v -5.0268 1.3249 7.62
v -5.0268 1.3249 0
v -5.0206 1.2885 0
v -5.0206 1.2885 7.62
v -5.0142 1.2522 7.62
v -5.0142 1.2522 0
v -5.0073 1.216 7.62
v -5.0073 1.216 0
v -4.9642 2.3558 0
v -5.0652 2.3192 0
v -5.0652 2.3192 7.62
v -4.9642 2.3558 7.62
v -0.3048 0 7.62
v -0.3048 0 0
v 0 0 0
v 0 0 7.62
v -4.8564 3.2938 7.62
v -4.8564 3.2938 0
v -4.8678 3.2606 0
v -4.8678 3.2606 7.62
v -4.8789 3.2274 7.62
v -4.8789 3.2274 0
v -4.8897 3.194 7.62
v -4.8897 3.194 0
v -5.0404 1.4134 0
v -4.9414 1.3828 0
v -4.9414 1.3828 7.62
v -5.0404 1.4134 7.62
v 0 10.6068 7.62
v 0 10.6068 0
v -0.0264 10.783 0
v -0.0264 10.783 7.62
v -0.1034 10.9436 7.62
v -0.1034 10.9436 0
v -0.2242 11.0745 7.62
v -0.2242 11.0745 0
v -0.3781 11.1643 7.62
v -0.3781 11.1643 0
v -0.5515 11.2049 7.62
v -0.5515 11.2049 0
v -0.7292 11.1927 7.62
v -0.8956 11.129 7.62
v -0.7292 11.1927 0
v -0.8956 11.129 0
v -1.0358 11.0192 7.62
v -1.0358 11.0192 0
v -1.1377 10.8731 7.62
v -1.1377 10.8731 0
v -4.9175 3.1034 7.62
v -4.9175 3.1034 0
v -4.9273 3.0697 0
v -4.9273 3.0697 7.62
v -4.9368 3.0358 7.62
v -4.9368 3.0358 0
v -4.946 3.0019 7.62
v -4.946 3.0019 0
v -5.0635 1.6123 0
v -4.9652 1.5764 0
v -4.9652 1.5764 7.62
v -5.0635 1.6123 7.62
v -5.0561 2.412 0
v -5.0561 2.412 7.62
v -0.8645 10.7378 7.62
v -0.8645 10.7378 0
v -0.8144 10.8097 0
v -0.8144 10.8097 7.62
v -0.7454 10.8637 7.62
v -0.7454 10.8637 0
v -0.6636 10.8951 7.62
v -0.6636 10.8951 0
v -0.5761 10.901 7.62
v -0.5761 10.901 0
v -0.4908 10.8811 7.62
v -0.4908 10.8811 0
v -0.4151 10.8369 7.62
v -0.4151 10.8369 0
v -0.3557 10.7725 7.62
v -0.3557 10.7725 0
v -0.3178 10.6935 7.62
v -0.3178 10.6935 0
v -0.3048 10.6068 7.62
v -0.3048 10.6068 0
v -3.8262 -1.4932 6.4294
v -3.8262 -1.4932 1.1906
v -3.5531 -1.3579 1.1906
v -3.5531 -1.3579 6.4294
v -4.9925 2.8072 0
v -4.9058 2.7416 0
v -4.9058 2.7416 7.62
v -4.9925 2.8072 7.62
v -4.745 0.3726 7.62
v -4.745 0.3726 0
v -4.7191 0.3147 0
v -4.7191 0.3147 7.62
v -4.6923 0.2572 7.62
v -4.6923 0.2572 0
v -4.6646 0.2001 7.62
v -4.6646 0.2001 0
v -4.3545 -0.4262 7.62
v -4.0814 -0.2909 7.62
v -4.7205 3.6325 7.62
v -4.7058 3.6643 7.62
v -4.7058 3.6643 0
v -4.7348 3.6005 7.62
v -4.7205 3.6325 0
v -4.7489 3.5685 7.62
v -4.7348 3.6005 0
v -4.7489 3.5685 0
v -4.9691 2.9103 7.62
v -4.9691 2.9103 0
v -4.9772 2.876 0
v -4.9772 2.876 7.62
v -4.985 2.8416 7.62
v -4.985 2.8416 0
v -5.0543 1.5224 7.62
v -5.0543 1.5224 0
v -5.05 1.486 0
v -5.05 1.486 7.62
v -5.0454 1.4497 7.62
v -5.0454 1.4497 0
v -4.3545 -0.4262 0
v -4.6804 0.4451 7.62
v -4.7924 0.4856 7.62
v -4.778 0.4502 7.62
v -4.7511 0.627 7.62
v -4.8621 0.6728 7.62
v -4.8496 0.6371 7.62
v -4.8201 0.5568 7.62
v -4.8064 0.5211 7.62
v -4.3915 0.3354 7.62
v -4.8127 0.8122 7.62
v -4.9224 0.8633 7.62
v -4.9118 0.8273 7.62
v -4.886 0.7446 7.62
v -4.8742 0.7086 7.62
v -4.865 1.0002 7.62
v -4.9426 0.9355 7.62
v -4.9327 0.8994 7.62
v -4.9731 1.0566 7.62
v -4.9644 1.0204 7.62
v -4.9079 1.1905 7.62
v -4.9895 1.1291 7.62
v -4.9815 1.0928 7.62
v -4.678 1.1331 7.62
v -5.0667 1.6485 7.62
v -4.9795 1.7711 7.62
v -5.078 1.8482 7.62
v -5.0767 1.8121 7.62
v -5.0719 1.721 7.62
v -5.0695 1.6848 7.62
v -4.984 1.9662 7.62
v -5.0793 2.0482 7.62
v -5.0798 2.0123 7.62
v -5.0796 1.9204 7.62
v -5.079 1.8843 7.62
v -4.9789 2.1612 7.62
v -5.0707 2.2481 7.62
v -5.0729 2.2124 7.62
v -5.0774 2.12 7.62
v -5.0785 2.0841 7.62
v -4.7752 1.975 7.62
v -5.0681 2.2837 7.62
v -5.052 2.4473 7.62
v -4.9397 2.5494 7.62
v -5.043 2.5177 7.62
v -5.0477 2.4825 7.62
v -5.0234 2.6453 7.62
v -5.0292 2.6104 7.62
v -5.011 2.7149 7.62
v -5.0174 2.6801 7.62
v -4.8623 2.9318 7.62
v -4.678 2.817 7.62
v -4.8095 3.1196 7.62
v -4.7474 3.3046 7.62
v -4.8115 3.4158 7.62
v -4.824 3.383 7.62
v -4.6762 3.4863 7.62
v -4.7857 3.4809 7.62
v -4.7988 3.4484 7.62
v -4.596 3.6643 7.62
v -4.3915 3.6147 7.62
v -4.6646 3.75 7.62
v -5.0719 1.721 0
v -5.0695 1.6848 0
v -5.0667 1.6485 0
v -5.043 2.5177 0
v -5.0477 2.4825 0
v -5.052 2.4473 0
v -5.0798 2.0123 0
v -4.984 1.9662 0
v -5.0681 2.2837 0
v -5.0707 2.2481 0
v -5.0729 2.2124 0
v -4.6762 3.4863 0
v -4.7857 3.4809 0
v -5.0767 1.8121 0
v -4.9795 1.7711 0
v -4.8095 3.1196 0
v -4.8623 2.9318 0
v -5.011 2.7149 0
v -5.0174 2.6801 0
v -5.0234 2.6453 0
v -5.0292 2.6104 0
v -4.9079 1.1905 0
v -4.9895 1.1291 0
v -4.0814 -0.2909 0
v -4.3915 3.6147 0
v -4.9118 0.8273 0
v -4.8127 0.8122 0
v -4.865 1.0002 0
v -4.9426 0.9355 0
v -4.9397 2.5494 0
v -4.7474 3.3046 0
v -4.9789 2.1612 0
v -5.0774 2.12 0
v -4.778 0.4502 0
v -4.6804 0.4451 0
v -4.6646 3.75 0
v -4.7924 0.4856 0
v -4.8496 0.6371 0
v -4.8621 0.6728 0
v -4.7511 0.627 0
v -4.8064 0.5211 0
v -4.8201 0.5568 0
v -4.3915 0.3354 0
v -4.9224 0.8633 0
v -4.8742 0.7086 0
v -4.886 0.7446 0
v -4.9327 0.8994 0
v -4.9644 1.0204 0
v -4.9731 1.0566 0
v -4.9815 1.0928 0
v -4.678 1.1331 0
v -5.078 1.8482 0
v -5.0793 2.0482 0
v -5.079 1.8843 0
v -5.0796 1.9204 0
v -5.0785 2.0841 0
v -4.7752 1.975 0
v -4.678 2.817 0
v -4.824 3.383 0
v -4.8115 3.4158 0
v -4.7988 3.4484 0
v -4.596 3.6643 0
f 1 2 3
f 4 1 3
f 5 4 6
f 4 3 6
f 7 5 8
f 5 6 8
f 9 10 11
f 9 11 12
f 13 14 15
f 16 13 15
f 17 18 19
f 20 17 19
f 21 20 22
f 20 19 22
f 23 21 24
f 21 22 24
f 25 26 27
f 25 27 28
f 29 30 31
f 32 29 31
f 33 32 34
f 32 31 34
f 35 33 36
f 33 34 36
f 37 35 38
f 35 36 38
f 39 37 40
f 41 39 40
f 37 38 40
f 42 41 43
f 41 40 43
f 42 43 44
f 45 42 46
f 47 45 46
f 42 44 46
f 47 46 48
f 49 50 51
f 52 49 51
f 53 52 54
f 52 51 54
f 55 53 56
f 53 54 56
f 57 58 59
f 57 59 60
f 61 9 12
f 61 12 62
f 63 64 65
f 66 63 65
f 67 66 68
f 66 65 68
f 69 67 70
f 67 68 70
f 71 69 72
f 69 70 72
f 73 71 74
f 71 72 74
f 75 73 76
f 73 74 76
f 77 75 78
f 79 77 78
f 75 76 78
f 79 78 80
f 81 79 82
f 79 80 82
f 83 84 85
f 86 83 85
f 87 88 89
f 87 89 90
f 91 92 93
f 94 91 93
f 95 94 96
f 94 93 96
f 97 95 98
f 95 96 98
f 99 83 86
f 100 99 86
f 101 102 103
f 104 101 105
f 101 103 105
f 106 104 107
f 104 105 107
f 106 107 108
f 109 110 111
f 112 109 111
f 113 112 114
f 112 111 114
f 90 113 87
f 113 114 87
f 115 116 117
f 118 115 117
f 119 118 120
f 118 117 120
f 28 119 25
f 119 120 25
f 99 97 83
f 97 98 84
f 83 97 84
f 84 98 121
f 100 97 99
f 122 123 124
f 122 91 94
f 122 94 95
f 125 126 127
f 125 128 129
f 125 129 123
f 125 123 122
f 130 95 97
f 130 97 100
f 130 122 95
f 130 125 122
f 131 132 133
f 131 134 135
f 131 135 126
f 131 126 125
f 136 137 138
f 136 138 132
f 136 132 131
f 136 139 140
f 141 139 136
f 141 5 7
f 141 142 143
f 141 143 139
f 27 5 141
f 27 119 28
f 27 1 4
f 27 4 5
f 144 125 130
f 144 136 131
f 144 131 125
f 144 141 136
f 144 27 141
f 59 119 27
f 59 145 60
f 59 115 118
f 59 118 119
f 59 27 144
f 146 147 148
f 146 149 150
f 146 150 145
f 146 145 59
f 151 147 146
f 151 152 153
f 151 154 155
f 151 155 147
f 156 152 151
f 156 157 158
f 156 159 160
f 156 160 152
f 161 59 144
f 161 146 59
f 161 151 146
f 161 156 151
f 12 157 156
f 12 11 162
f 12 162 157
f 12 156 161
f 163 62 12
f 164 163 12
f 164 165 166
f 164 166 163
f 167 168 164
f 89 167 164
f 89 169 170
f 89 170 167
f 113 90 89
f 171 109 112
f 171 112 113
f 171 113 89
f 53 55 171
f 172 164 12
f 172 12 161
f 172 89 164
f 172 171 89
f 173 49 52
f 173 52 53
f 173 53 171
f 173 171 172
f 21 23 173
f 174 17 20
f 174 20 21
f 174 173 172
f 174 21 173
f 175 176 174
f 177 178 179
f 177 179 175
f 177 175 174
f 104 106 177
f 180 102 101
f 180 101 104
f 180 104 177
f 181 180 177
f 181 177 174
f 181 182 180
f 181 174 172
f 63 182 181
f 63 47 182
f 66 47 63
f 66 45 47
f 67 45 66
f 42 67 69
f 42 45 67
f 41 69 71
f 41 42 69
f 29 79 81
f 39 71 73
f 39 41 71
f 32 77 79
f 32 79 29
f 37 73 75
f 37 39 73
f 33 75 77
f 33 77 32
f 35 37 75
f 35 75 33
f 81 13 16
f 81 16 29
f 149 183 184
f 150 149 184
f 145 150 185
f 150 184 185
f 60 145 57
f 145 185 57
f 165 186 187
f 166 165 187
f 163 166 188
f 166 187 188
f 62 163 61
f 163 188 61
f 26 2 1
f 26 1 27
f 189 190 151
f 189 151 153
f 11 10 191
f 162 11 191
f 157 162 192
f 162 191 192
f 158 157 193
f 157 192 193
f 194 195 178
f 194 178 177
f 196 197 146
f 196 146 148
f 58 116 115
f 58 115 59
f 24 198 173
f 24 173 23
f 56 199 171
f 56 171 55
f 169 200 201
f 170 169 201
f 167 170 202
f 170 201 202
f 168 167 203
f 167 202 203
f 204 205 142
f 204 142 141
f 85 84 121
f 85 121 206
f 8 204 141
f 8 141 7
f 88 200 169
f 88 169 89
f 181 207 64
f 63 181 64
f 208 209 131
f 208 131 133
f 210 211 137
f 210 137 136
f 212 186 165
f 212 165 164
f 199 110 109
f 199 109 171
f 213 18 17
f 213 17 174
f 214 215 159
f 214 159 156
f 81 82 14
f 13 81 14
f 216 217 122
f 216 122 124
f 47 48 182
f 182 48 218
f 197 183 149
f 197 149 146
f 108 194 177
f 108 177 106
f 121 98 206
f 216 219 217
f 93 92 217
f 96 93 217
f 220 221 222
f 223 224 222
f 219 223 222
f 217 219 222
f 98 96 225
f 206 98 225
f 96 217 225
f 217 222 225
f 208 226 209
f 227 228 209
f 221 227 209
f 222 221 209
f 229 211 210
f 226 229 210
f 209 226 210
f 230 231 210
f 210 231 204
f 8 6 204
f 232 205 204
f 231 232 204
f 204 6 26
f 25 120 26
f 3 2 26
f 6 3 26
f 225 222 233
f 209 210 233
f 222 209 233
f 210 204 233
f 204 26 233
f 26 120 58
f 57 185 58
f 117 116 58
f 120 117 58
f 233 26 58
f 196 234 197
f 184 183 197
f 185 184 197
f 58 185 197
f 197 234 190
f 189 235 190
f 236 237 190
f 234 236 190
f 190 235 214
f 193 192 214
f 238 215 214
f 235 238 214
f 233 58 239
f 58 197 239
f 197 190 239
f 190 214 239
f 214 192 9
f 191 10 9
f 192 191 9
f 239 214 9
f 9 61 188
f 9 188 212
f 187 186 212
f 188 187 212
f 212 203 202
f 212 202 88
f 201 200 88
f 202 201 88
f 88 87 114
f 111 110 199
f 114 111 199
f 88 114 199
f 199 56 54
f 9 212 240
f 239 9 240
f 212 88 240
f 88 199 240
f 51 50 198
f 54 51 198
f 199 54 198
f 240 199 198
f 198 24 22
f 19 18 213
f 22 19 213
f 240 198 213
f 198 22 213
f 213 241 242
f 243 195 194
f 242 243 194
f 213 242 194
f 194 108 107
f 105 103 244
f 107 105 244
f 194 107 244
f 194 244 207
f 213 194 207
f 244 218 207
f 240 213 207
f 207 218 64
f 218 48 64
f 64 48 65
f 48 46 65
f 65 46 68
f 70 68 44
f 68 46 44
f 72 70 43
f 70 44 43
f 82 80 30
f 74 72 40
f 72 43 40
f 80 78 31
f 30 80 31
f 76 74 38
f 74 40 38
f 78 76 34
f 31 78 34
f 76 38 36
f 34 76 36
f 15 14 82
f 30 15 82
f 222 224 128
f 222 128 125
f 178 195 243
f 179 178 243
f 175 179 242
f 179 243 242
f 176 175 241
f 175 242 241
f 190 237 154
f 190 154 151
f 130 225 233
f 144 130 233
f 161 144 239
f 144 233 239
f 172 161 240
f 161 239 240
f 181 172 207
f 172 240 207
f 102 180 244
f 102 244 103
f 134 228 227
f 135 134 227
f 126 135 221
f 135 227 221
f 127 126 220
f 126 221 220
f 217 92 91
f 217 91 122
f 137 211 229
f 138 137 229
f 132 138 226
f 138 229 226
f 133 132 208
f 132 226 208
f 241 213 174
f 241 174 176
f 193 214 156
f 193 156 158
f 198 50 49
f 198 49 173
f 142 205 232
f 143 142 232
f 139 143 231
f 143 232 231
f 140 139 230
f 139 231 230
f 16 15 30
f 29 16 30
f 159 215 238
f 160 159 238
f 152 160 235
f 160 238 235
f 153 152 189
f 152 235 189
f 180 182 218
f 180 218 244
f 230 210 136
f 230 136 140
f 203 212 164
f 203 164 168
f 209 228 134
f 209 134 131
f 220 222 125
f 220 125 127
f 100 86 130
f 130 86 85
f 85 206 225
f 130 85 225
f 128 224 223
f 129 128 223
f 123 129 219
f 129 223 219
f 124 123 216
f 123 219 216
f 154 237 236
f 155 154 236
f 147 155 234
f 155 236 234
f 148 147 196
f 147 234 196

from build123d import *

# Parameters (mm, degrees)
EXTRUDE_THIN1_DEPTH = 7.62
CHAMFER1_SIZE       = 1.190625
CUT_EXTRUDE1_DEPTH  = 15.472853006
CRVPATTERN1_DEPTH   = 7.62


# Read off the part's stored shape, not the designer's step: CrvPattern1
with BuildPart() as part:
    # Sketch2 → Extrude-Thin1 (new body)
    with BuildSketch(Plane.XY):
        with BuildLine():
            Line((0, 0), (0, 10.606813737))
            ThreePointArc((0, 10.606813737), (-0.463285182, 11.191030357), (-1.137696862, 10.873050632))
            Line((-1.137696862, 10.873050632), (-4.664645747, 3.749960706))
            ThreePointArc((-4.664645747, 3.749960706), (-5.08, 1.975048069), (-4.664645747, 0.200135433))
            Line((-4.664645747, 0.200135433), (-3.82620918, -1.493186263))
            Line((-3.82620918, -1.493186263), (-3.553059174, -1.35793792))
            Line((-3.553059174, -1.35793792), (-4.391495741, 0.335383776))
            ThreePointArc((-4.391495741, 0.335383776), (-4.7752, 1.975048069), (-4.391495741, 3.614712363))
            Line((-4.391495741, 3.614712363), (-0.864546856, 10.737802289))
            ThreePointArc((-0.864546856, 10.737802289), (-0.53273631, 10.894248314), (-0.3048, 10.606813737))
            Line((-0.3048, 10.606813737), (-0.3048, 0))
            Line((-0.3048, 0), (0, 0))
        make_face()
    extrude(amount=EXTRUDE_THIN1_DEPTH)

    # Chamfer1
    chamfer1_edges = [part.edges().sort_by_distance(p)[0] for p in [
        (-3.689634177, -1.425562092, 0),
        (-3.689634177, -1.425562092, 7.62),
    ]]
    chamfer(chamfer1_edges, length=CHAMFER1_SIZE)

    # Sketch4 → Cut-Extrude1 (cut, through all)
    with BuildSketch(Plane.XY.offset(7.62)):
        with BuildLine():
            Line((-4.664645747, 3.749960706), (-4.596046712, 3.664267155))
            Line((-4.596046712, 3.664267155), (-4.705815616, 3.664267155))
            ThreePointArc((-4.705815616, 3.664267155), (-4.685485281, 3.707236248), (-4.664645747, 3.749960706))
        make_face()
    extrude(amount=-CUT_EXTRUDE1_DEPTH, mode=Mode.SUBTRACT)

    # CrvPattern1 outline → CrvPattern1 (cut)
    with BuildSketch(Plane.XY):
        with BuildLine():
            Line((-4.744975764, 0.372564793), (-4.680378039, 0.445121042))
            Line((-4.680378039, 0.445121042), (-4.777966042, 0.450237541))
            ThreePointArc((-4.777966042, 0.450237541), (-4.761675743, 0.411314165), (-4.744975764, 0.372564793))
        make_face()
        with BuildLine():
            ThreePointArc((-4.748910862, 3.568501265), (-4.767580416, 3.524806333), (-4.785729607, 3.48089271))
            Line((-4.785729607, 3.48089271), (-4.676162545, 3.486332727))
            Line((-4.676162545, 3.486332727), (-4.748910862, 3.568501265))
        make_face()
        with BuildLine():
            ThreePointArc((-4.824009644, 3.383022425), (-4.840450562, 3.338503815), (-4.856362147, 3.293793281))
            Line((-4.856362147, 3.293793281), (-4.747356217, 3.304644344))
            Line((-4.747356217, 3.304644344), (-4.824009644, 3.383022425))
        make_face()
        with BuildLine():
            ThreePointArc((-4.889747992, 3.19399033), (-4.903912846, 3.148798701), (-4.917541653, 3.103442532))
            Line((-4.917541653, 3.103442532), (-4.809452549, 3.119649065))
            Line((-4.809452549, 3.119649065), (-4.889747992, 3.19399033))
        make_face()
        with BuildLine():
            ThreePointArc((-4.945955852, 3.001880747), (-4.957808713, 2.956169664), (-4.969121106, 2.910321838))
            Line((-4.969121106, 2.910321838), (-4.862298748, 2.931802088))
            Line((-4.862298748, 2.931802088), (-4.945955852, 3.001880747))
        make_face()
        with BuildLine():
            ThreePointArc((-4.992487715, 2.807177794), (-5.002004339, 2.761102753), (-5.010978384, 2.714918968))
            Line((-5.010978384, 2.714918968), (-4.905764782, 2.741565627))
            Line((-4.905764782, 2.741565627), (-4.992487715, 2.807177794))
        make_face()
        with BuildLine():
            ThreePointArc((-5.02922305, 2.610372633), (-5.036390971, 2.564090075), (-5.043016507, 2.517726765))
            Line((-5.043016507, 2.517726765), (-4.939743698, 2.549407773))
            Line((-4.939743698, 2.549407773), (-5.02922305, 2.610372633))
        make_face()
        with BuildLine():
            ThreePointArc((-5.056066661, 2.411962141), (-5.060885198, 2.365628463), (-5.06516382, 2.319241812))
            Line((-5.06516382, 2.319241812), (-4.96415189, 2.355801348))
            Line((-4.96415189, 2.355801348), (-5.056066661, 2.411962141))
        make_face()
        with BuildLine():
            ThreePointArc((-5.07294897, 2.212447566), (-5.075429139, 2.166218137), (-5.077374093, 2.1199631))
            Line((-5.077374093, 2.1199631), (-4.978929297, 2.161222738))
            Line((-4.978929297, 2.161222738), (-5.07294897, 2.212447566))
        make_face()
        with BuildLine():
            ThreePointArc((-5.079826224, 2.012333162), (-5.079990568, 1.966361356), (-5.079626554, 1.920390698))
            Line((-5.079626554, 1.920390698), (-4.98403956, 1.966150718))
            Line((-4.98403956, 1.966150718), (-5.079826224, 2.012333162))
        make_face()
        with BuildLine():
            ThreePointArc((-5.076680625, 1.812124816), (-5.074562951, 1.766561064), (-5.071925849, 1.721024422))
            Line((-5.071925849, 1.721024422), (-4.979470103, 1.771065282))
            Line((-4.979470103, 1.771065282), (-5.076680625, 1.812124816))
        make_face()
        with BuildLine():
            ThreePointArc((-5.063520382, 1.612328668), (-5.059165421, 1.567319544), (-5.054301926, 1.522362527))
            Line((-5.054301926, 1.522362527), (-4.965232171, 1.576446452))
            Line((-4.965232171, 1.576446452), (-5.063520382, 1.612328668))
        make_face()
        with BuildLine():
            ThreePointArc((-5.040379693, 1.413449735), (-5.033842672, 1.369137078), (-5.026809852, 1.324900401))
            Line((-5.026809852, 1.324900401), (-4.941360798, 1.382773106))
            Line((-4.941360798, 1.382773106), (-5.040379693, 1.413449735))
        make_face()
        with BuildLine():
            ThreePointArc((-5.007318634, 1.215990531), (-4.998664778, 1.172510618), (-4.989529564, 1.129129286))
            Line((-4.989529564, 1.129129286), (-4.907914719, 1.190521793))
            Line((-4.907914719, 1.190521793), (-5.007318634, 1.215990531))
        make_face()
        with BuildLine():
            ThreePointArc((-4.964422988, 1.020449699), (-4.953726948, 0.977932464), (-4.942565548, 0.935535016))
            Line((-4.942565548, 0.935535016), (-4.864976234, 1.000165564))
            Line((-4.864976234, 1.000165564), (-4.964422988, 1.020449699))
        make_face()
        with BuildLine():
            ThreePointArc((-4.911803987, 0.827320662), (-4.899149207, 0.785888981), (-4.886046457, 0.744596783))
            Line((-4.886046457, 0.744596783), (-4.812650995, 0.812172807))
            Line((-4.812650995, 0.812172807), (-4.911803987, 0.827320662))
        make_face()
        with BuildLine():
            ThreePointArc((-4.849597983, 0.63709028), (-4.835076, 0.596859317), (-4.820124666, 0.556785934))
            Line((-4.820124666, 0.556785934), (-4.751067753, 0.627006093))
            Line((-4.751067753, 0.627006093), (-4.849597983, 0.63709028))
        make_face()
    extrude(amount=CRVPATTERN1_DEPTH, mode=Mode.SUBTRACT)


solid = part.part
